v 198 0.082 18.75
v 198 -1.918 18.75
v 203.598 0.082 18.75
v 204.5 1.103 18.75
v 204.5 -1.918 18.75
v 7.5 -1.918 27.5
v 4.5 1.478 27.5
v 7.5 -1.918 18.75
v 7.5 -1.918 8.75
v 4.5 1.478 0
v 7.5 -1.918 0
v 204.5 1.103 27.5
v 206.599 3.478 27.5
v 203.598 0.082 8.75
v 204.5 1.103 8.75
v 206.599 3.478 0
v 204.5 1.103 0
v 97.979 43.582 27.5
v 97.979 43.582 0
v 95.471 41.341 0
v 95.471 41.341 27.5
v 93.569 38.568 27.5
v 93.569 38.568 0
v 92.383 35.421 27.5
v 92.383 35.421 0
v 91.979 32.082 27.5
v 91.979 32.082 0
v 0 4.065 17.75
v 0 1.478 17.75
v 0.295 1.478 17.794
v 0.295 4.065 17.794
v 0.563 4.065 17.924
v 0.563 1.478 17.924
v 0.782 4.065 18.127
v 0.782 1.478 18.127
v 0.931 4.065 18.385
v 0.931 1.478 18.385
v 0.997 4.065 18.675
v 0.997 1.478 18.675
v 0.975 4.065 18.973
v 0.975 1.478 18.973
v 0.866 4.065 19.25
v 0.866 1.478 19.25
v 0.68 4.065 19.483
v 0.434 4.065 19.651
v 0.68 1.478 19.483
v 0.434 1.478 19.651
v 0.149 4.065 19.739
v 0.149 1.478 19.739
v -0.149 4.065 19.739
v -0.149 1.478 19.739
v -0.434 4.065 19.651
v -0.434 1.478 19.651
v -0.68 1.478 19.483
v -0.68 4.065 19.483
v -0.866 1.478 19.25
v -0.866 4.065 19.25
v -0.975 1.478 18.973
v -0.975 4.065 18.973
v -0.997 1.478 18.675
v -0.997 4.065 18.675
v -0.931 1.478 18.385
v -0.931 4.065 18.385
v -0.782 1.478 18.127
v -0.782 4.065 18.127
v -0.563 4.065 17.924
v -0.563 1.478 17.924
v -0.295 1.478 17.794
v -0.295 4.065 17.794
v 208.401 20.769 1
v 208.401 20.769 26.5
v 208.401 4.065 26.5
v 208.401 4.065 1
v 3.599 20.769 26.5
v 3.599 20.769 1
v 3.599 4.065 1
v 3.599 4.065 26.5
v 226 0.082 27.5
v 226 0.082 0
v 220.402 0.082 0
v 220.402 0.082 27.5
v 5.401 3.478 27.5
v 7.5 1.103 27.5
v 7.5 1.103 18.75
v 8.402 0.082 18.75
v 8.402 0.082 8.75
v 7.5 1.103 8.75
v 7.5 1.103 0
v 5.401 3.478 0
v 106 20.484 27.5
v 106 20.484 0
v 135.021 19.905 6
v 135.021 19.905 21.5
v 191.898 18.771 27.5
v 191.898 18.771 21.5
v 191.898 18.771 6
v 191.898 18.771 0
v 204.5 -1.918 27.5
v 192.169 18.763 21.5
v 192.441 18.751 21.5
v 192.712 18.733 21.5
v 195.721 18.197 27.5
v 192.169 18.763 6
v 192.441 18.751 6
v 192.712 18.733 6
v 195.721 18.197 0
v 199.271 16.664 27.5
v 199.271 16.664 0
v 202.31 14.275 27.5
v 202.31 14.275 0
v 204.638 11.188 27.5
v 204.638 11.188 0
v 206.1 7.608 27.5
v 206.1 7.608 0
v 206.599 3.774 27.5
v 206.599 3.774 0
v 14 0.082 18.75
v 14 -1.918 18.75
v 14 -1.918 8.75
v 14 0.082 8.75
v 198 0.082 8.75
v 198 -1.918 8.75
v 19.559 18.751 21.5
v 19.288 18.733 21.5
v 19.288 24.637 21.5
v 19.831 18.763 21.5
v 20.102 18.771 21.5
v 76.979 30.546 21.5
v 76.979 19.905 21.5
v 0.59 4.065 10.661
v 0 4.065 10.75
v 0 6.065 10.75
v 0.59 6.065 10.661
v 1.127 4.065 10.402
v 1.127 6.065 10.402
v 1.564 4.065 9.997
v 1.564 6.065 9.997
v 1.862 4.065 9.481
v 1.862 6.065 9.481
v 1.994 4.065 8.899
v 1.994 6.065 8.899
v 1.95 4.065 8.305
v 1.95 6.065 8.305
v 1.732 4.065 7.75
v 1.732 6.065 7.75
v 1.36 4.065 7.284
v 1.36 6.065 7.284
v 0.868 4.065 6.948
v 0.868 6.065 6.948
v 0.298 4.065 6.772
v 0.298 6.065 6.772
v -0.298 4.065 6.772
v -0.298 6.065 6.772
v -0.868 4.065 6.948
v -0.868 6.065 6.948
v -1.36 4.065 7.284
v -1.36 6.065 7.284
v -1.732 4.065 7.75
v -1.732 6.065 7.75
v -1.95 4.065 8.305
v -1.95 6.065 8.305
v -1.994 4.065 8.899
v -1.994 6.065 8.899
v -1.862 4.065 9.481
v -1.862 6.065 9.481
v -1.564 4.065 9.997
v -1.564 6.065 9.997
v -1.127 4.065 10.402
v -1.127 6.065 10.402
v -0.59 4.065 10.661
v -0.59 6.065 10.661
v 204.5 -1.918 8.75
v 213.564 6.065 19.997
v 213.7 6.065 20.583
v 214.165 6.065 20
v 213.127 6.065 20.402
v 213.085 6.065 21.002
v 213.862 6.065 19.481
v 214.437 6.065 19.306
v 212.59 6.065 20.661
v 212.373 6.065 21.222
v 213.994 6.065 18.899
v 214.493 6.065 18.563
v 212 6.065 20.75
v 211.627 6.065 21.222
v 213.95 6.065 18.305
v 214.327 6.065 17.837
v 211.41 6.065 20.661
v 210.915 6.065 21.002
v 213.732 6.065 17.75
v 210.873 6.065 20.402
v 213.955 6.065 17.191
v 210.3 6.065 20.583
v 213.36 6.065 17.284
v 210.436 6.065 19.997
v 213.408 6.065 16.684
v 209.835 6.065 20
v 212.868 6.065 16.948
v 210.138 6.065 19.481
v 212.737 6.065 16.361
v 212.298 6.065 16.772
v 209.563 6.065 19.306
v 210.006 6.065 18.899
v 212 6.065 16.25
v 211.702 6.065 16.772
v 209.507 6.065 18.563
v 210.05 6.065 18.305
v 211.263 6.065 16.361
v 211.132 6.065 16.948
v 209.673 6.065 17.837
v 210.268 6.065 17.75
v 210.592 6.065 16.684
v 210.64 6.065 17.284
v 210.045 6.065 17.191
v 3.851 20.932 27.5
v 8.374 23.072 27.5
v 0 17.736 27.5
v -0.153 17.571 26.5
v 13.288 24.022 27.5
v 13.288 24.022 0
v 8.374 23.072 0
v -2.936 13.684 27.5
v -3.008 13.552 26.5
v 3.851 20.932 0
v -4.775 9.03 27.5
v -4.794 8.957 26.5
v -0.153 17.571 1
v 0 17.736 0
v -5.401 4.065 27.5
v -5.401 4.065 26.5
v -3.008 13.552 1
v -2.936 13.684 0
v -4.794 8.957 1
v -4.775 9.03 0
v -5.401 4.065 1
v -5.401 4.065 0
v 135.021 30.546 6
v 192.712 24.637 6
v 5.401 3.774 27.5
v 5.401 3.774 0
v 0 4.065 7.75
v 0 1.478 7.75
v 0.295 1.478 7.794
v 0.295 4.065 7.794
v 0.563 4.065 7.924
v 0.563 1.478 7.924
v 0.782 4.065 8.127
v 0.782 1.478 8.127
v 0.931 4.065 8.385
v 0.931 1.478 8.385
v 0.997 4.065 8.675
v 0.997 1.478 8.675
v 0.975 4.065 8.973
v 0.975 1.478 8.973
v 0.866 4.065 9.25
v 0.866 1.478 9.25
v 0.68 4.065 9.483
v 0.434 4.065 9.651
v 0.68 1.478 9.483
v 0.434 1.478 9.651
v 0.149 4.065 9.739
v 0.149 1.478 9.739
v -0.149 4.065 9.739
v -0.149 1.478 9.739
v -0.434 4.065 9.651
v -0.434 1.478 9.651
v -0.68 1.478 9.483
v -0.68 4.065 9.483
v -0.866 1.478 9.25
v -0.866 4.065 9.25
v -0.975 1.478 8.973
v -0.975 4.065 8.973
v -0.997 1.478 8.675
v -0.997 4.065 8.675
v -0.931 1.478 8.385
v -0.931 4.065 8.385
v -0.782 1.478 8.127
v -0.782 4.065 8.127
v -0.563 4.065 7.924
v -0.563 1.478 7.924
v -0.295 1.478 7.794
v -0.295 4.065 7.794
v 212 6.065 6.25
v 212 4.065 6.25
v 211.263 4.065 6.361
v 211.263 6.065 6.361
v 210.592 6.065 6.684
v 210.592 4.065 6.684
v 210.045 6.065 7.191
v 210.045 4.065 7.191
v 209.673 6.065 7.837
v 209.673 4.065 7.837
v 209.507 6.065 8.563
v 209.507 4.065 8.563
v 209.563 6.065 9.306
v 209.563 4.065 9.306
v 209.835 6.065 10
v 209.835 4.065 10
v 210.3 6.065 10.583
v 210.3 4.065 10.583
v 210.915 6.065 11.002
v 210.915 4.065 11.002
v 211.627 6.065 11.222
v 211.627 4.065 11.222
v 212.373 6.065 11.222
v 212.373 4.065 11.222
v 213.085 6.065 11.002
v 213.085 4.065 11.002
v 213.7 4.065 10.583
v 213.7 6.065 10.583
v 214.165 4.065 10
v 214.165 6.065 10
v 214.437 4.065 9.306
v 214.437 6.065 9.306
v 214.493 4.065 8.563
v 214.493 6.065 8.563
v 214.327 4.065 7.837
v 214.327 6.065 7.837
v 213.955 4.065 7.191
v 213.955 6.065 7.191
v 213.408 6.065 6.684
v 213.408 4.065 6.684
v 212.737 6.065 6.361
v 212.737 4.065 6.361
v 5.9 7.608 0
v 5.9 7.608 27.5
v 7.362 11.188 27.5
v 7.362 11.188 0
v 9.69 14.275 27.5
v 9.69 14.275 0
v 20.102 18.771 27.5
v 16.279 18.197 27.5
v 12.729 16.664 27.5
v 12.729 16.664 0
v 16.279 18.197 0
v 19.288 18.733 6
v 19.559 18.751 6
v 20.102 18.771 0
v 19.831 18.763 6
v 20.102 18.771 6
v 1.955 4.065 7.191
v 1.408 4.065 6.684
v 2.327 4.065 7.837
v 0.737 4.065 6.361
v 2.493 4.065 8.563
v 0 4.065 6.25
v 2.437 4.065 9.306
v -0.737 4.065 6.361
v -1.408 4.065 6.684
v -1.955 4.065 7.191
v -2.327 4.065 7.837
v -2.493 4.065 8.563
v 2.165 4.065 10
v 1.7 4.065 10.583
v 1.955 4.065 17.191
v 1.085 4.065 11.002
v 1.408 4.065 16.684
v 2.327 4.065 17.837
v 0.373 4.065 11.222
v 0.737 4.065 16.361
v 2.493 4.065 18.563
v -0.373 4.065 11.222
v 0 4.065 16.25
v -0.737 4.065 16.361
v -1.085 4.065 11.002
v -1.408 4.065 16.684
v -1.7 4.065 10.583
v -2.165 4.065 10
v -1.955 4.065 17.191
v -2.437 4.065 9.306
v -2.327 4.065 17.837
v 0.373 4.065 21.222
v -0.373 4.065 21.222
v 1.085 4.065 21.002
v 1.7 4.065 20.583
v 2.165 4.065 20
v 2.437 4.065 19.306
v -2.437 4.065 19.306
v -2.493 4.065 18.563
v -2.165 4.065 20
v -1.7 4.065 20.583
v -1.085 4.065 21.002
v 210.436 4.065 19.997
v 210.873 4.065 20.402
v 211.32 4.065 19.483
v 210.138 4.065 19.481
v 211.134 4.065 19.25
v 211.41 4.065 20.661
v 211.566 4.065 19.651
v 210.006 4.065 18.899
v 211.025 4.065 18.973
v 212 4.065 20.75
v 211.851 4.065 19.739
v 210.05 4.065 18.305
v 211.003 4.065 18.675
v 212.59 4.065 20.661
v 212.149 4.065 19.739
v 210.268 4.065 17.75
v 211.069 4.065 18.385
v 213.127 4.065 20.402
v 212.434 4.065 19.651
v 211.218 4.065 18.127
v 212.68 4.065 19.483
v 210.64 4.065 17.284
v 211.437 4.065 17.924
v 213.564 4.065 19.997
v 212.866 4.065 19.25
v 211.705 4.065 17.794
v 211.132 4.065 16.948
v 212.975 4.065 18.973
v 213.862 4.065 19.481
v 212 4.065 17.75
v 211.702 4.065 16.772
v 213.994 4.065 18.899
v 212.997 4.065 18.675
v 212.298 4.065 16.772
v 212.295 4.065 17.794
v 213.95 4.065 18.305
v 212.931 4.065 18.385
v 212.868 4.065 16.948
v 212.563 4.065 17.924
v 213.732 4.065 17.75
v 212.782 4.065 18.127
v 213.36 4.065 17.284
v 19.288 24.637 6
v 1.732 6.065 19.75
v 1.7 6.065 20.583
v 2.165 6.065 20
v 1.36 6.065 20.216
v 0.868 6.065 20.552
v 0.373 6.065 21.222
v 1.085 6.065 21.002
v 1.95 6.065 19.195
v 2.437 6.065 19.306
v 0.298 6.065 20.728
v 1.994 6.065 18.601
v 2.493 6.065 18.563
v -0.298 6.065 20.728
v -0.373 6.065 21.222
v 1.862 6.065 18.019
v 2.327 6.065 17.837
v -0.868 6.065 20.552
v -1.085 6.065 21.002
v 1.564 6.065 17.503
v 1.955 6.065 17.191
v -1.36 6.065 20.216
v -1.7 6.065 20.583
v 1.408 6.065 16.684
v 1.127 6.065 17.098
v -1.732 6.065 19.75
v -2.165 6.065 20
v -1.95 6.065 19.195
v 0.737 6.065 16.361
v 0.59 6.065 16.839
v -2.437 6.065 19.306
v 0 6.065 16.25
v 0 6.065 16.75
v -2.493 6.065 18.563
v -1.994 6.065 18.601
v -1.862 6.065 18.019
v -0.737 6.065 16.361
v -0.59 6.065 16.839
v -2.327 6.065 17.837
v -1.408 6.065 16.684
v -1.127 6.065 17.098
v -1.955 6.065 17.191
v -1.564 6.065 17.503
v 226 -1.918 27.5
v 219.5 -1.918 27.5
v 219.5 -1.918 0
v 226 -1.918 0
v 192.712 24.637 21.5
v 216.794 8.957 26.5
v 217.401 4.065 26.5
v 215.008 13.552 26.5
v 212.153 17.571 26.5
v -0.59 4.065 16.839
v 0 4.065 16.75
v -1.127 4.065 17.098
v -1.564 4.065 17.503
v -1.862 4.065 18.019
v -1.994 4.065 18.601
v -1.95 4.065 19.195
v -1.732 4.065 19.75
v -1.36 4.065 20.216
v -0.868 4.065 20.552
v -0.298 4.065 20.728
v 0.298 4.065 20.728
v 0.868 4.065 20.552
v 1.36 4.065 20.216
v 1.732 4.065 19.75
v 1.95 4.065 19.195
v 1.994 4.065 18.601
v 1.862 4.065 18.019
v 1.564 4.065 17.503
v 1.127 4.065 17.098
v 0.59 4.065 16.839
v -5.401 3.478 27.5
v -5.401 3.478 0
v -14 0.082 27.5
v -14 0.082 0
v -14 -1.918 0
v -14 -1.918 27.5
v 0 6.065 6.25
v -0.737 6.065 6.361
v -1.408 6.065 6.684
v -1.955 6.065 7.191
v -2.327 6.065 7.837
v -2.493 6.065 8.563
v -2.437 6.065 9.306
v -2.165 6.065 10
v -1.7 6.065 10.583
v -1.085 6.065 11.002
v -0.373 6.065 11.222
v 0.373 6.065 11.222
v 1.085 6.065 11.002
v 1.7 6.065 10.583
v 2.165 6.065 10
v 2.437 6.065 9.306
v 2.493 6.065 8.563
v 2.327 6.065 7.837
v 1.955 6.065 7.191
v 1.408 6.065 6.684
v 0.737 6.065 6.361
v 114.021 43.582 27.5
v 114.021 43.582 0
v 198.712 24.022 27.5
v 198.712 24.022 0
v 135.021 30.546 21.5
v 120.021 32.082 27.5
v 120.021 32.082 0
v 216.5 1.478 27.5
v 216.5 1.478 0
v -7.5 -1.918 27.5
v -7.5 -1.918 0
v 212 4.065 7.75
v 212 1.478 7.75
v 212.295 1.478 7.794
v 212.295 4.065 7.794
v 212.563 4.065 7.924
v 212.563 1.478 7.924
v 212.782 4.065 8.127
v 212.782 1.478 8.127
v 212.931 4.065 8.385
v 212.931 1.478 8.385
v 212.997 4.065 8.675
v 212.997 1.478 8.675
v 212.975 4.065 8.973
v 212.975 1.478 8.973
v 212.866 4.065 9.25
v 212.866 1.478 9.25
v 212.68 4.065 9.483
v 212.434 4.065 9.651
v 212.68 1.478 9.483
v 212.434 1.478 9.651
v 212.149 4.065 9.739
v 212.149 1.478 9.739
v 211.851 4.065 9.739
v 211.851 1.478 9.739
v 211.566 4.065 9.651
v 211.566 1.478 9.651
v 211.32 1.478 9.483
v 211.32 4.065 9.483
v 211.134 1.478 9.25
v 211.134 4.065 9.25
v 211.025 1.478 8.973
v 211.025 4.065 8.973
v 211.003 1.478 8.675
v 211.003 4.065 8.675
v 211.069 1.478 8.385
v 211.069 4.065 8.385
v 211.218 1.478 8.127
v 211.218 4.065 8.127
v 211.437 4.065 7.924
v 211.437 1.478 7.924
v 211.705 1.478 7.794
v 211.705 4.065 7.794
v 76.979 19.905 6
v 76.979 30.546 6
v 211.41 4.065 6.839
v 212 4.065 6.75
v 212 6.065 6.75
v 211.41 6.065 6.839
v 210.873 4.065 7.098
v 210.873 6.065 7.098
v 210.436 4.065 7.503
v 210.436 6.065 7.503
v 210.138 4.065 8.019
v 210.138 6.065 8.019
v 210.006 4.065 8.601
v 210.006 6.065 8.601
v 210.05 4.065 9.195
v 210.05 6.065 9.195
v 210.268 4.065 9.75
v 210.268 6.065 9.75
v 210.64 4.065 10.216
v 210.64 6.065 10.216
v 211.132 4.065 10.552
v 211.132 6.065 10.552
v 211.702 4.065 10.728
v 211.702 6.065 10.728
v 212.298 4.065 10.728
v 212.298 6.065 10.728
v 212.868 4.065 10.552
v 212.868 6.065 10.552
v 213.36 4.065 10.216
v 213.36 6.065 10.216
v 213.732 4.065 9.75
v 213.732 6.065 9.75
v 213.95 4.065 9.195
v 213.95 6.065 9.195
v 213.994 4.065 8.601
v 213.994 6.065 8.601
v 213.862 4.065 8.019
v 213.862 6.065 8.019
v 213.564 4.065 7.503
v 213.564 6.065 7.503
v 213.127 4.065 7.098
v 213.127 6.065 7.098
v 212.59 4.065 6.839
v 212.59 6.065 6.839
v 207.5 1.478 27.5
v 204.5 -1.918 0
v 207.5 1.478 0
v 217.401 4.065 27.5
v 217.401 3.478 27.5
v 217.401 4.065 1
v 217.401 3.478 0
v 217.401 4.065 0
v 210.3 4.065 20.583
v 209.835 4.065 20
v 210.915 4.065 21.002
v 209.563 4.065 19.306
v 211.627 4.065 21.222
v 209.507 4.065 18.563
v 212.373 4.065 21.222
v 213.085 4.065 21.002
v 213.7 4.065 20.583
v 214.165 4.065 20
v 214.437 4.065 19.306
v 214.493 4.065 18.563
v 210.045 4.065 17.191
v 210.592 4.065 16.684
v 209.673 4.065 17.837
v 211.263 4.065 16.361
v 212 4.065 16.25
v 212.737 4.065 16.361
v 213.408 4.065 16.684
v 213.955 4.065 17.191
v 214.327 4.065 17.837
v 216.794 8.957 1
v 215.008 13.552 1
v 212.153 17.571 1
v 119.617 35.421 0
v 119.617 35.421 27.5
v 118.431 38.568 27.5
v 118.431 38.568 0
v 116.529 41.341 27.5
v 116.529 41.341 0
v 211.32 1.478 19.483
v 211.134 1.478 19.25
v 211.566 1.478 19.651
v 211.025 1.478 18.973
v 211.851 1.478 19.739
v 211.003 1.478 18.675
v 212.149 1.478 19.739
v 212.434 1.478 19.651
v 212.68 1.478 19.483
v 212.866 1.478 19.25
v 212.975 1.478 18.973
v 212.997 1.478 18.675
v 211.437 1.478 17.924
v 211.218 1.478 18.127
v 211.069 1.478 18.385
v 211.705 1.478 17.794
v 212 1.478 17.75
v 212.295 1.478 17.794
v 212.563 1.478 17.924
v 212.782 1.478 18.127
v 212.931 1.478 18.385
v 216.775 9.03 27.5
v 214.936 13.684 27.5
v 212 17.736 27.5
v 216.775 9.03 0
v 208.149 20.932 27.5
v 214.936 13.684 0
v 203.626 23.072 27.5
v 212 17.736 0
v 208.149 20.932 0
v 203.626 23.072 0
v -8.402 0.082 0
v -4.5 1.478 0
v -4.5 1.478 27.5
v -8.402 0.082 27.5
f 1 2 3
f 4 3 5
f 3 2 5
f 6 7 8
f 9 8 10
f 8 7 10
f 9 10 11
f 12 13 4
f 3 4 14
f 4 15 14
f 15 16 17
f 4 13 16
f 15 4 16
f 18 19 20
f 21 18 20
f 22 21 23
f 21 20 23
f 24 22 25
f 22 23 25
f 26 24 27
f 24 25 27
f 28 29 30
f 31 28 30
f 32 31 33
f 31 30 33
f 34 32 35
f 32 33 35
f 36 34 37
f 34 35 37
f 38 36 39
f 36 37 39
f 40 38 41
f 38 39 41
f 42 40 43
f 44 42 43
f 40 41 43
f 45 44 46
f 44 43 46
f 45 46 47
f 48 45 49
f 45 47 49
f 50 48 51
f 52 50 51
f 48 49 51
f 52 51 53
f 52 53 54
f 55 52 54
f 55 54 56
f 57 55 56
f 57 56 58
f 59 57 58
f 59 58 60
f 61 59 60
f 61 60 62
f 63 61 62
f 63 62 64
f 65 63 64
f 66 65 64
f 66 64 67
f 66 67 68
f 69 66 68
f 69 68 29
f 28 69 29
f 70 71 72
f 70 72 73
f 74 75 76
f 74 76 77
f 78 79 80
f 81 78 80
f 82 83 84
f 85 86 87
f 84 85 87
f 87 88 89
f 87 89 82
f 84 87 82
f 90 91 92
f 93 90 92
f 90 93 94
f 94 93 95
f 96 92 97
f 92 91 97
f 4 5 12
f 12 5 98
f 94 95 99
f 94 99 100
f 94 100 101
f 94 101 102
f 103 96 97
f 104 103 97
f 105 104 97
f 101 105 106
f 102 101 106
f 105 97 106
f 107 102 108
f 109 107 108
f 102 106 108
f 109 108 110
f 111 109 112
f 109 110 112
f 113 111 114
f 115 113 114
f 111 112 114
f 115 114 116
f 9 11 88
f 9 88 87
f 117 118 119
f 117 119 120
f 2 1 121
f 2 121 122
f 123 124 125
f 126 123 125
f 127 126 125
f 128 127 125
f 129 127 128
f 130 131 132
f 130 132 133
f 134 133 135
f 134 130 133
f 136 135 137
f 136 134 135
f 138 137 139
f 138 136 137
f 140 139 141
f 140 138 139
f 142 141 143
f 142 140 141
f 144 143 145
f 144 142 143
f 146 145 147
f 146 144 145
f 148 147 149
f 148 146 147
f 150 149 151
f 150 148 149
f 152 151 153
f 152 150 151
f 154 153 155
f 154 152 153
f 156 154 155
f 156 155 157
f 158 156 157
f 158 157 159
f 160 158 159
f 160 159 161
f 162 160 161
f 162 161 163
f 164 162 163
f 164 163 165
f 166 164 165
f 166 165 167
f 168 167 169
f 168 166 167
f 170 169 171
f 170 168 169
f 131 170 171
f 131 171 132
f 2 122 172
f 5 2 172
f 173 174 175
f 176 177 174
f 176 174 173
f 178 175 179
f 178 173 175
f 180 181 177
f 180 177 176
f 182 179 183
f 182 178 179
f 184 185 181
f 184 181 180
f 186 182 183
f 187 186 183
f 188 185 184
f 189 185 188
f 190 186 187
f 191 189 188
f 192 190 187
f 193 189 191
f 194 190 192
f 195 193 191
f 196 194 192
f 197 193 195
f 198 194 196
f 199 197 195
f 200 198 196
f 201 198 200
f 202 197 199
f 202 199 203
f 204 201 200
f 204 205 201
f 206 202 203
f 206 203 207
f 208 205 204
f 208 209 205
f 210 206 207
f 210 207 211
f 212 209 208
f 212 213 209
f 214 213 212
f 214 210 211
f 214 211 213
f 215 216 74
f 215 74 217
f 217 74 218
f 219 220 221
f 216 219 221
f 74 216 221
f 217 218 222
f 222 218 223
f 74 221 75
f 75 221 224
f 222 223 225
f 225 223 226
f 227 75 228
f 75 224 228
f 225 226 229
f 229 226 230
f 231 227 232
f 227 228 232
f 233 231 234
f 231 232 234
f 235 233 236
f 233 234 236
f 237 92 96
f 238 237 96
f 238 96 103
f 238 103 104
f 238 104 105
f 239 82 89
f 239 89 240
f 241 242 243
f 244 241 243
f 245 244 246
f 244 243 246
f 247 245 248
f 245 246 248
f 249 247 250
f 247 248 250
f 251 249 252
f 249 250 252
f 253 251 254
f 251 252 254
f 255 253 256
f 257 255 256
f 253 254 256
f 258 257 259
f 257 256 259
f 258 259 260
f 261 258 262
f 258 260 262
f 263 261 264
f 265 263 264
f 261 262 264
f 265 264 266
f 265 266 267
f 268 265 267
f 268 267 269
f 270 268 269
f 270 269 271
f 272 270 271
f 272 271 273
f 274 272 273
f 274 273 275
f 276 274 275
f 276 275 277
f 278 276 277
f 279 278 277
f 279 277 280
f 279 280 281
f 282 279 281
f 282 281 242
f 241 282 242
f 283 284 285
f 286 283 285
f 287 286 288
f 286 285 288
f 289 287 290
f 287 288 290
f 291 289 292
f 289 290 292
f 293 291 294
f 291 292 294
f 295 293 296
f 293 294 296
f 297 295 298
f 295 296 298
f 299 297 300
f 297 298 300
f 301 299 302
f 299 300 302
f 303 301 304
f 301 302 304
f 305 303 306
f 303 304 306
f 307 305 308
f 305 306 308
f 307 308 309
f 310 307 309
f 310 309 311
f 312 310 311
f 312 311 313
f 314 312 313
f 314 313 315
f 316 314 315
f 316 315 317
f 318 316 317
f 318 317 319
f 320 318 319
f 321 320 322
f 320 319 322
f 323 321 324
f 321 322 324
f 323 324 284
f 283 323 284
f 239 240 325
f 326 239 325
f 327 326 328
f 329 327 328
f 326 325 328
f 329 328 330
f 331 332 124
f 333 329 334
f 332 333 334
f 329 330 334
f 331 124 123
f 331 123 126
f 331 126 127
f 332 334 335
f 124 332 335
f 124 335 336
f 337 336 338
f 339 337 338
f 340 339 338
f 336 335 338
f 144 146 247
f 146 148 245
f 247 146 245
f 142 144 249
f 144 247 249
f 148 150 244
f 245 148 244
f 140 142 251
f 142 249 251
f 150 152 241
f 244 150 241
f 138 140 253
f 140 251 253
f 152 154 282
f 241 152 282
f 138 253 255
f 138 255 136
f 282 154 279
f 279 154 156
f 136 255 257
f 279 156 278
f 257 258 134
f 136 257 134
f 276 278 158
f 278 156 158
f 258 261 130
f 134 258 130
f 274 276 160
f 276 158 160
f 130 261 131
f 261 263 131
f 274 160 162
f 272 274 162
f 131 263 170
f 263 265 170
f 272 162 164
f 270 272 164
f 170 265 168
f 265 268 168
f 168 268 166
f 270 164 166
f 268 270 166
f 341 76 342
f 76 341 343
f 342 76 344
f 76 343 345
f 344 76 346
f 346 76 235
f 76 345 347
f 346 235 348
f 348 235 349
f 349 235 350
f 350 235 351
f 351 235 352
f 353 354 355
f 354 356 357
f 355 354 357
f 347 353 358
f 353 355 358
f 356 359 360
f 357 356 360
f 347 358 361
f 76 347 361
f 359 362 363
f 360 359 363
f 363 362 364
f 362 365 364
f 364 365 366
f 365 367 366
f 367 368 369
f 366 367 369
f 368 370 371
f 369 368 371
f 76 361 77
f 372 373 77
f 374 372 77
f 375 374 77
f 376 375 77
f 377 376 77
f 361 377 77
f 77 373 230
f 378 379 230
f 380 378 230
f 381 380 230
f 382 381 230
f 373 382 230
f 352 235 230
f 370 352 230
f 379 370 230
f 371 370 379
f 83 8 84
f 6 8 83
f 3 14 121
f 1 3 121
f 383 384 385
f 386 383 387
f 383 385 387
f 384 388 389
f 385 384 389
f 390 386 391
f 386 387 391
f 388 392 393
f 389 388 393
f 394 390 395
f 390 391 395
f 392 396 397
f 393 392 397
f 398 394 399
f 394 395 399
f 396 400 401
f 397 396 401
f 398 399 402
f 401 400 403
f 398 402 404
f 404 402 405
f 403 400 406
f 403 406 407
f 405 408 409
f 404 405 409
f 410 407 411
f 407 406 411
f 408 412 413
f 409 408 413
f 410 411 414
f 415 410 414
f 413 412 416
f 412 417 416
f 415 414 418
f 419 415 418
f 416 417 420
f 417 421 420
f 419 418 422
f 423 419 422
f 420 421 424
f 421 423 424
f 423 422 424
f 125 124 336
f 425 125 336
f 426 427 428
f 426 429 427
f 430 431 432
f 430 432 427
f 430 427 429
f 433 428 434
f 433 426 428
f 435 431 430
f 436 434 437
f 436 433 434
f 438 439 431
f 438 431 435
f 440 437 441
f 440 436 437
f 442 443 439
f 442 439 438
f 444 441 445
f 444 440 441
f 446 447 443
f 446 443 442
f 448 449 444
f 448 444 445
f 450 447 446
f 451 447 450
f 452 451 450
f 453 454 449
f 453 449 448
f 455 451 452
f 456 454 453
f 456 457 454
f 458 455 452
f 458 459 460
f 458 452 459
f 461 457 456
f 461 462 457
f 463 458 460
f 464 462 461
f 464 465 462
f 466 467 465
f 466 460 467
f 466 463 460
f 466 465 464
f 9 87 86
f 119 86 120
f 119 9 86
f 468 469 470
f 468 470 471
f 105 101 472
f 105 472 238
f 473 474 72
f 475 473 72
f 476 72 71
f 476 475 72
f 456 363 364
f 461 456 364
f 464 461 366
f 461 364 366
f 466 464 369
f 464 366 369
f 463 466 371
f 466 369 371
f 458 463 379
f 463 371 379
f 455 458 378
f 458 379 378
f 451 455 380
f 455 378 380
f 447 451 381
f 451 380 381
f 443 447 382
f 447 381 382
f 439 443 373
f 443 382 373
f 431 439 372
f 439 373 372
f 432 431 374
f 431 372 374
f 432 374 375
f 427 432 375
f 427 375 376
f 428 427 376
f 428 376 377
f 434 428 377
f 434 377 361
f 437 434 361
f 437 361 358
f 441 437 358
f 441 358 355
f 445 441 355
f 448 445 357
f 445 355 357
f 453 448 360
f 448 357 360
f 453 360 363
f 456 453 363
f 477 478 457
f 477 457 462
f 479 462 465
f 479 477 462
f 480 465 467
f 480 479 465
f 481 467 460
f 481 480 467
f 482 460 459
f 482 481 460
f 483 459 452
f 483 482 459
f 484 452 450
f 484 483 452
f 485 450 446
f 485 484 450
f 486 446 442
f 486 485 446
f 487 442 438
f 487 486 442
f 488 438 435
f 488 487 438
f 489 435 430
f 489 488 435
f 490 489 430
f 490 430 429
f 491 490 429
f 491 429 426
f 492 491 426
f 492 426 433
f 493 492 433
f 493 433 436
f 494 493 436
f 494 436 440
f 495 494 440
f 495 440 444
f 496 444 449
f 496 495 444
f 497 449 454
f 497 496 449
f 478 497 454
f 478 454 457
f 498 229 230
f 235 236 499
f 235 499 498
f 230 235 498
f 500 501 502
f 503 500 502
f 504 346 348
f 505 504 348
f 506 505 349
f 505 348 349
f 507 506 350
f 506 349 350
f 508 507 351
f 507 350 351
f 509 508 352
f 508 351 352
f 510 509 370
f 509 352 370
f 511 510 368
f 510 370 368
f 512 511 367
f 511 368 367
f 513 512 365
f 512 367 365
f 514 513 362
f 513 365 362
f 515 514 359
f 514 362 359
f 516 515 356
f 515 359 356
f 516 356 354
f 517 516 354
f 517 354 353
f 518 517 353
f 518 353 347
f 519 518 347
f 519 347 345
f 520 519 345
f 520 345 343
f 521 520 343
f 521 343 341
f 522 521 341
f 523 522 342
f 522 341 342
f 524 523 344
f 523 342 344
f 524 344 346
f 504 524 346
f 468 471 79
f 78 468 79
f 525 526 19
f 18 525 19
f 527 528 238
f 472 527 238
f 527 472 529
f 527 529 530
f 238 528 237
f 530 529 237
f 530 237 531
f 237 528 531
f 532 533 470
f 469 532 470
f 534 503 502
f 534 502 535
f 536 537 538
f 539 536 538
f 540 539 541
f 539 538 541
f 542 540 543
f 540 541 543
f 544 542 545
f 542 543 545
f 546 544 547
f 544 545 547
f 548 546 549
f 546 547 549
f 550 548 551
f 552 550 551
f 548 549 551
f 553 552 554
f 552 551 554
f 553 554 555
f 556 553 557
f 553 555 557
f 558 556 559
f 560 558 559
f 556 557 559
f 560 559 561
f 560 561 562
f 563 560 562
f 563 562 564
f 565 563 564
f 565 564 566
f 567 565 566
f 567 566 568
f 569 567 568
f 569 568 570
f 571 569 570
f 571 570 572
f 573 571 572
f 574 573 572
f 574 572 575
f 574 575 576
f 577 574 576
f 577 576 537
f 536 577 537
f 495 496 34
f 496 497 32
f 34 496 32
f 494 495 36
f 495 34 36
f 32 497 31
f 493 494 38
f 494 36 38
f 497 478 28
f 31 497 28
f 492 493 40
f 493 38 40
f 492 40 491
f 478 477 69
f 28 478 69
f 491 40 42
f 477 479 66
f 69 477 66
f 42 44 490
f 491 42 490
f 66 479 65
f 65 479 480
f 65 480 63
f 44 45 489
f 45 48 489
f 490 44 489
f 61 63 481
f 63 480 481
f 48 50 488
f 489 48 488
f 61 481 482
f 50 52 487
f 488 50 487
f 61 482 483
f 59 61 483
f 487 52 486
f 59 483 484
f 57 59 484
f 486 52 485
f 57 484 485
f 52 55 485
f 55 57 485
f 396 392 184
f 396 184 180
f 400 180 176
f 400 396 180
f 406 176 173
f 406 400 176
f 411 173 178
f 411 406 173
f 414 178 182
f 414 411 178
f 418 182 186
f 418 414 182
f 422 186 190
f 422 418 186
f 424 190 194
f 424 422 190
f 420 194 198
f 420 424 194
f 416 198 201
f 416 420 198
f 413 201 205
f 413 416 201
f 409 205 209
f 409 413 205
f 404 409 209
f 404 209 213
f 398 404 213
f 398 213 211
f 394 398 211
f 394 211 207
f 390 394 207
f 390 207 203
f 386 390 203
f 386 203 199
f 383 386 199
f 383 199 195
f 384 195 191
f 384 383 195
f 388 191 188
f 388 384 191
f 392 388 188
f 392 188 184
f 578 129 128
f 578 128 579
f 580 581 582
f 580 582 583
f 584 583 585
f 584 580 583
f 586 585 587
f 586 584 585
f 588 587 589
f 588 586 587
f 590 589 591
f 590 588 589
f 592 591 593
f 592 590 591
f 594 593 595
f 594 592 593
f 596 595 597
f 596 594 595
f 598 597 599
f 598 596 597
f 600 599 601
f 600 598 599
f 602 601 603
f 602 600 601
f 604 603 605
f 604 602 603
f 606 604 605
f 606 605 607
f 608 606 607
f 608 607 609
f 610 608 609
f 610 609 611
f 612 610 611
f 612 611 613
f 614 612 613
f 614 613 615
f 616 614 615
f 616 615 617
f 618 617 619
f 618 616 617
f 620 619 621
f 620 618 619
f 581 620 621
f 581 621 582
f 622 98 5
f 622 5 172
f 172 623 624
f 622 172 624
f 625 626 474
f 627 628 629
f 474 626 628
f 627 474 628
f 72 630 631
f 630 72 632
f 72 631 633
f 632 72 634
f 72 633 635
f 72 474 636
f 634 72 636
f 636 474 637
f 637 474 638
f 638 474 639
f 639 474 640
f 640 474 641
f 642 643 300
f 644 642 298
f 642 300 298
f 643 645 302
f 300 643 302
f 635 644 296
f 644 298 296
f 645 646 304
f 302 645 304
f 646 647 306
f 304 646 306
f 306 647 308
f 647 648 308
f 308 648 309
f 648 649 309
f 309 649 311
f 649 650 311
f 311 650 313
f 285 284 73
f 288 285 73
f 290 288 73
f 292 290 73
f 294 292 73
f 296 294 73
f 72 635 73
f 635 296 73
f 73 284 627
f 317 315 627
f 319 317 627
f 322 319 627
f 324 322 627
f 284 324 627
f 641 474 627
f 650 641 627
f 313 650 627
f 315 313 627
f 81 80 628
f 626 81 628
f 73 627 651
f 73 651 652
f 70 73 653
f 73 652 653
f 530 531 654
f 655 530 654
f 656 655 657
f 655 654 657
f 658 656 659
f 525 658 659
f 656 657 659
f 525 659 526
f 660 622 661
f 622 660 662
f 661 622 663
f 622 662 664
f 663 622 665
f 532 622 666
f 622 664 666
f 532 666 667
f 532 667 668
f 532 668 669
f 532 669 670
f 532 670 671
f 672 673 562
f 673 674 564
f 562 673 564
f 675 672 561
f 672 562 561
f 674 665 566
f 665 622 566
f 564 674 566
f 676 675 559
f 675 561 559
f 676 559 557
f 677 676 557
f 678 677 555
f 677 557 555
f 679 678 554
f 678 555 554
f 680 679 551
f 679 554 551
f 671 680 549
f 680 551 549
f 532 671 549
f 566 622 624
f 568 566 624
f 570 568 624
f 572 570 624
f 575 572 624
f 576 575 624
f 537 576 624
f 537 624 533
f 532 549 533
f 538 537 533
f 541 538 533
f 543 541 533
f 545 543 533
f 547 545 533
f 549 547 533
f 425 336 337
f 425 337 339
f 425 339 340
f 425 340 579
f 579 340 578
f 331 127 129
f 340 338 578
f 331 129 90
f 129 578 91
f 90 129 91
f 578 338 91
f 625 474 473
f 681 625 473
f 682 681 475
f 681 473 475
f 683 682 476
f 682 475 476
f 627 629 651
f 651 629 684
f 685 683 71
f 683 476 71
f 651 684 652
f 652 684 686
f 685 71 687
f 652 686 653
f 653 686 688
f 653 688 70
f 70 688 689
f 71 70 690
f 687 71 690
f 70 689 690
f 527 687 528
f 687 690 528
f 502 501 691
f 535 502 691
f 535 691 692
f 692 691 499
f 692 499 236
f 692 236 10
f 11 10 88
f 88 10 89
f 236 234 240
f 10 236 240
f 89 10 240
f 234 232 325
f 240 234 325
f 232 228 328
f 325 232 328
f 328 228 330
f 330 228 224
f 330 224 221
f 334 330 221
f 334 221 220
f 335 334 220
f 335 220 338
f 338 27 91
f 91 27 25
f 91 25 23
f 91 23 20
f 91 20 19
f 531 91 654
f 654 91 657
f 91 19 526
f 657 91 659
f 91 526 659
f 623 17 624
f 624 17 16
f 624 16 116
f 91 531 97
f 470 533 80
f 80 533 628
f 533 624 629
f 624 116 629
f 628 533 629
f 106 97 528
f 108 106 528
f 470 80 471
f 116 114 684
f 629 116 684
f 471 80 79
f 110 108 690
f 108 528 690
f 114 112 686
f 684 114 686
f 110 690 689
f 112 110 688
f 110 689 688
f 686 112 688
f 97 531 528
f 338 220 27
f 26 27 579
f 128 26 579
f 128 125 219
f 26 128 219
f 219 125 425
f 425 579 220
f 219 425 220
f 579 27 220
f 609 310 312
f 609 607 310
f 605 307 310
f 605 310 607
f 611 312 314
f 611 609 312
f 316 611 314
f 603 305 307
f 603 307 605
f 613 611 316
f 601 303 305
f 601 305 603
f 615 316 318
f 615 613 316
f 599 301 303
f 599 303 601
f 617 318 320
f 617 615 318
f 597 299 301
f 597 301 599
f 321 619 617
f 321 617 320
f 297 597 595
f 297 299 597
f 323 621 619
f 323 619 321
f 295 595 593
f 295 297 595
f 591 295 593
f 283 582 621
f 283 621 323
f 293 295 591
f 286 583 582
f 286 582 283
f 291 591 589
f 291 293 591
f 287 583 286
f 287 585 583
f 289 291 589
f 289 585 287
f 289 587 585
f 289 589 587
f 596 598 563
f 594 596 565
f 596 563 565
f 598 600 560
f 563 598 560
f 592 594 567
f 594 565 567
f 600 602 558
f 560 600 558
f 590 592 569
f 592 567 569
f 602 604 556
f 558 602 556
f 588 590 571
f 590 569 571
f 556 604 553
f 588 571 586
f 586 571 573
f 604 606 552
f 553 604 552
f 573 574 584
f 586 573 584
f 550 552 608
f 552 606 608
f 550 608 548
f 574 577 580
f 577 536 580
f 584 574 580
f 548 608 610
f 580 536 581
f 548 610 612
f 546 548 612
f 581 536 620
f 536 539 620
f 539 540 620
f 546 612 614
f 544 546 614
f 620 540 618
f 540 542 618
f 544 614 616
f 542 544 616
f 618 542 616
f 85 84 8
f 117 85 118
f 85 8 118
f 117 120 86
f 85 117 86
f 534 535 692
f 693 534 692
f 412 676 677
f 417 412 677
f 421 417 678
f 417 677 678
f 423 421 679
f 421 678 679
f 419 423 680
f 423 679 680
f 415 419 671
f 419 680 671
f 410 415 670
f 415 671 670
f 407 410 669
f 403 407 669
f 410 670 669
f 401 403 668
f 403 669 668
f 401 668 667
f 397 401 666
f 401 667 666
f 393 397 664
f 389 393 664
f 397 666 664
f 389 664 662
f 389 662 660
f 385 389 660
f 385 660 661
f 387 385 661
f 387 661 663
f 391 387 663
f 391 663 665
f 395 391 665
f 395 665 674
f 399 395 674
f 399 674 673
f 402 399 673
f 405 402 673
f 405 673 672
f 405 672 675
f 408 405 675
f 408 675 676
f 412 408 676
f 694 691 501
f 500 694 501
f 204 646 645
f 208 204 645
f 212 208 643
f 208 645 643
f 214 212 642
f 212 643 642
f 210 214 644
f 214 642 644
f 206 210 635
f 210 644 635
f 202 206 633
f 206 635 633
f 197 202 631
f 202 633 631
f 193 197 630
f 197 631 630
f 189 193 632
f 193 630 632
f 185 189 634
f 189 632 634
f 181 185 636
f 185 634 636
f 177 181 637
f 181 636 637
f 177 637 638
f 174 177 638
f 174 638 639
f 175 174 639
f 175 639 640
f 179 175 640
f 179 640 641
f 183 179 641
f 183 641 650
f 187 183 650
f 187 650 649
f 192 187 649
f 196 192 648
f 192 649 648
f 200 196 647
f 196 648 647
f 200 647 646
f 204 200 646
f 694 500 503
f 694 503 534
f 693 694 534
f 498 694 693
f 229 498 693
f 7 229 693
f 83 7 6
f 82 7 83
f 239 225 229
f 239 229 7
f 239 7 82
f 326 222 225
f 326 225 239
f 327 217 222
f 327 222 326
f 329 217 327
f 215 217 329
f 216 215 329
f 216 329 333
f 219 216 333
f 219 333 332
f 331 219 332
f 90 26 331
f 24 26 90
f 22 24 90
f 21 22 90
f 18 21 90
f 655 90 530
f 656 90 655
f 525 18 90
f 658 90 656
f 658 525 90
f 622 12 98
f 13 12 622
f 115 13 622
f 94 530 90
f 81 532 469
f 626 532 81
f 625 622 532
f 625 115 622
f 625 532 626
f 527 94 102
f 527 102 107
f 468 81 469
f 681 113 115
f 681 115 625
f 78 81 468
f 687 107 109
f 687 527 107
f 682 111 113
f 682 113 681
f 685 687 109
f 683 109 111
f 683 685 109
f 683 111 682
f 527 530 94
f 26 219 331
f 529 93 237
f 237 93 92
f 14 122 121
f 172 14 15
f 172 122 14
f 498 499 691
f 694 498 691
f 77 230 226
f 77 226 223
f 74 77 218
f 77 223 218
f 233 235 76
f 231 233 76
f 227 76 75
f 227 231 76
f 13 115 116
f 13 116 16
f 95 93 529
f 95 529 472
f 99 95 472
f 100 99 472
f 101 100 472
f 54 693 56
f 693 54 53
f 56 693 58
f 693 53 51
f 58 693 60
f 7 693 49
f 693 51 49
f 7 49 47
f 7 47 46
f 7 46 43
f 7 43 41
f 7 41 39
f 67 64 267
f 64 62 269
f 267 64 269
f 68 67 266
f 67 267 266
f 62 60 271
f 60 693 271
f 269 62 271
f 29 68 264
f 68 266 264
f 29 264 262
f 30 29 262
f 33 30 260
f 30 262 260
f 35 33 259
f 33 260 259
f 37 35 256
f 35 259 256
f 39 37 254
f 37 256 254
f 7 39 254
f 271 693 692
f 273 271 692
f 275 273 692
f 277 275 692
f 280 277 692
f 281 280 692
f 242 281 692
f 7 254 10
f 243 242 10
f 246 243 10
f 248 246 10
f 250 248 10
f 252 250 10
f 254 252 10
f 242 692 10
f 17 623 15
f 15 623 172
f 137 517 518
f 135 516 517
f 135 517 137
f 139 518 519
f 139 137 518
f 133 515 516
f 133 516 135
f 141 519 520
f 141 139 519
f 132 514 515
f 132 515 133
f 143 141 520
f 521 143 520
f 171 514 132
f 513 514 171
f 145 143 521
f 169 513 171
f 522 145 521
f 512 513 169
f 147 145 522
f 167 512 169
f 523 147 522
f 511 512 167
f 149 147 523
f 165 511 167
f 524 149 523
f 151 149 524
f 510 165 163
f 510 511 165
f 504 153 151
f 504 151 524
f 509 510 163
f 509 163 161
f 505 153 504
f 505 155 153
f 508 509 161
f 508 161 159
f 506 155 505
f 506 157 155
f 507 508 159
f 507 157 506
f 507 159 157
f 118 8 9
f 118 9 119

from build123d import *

# Parameters (mm, degrees)
BOSS_EXTRUDE1_DEPTH = 27.5
SKETCH3_W           = 6.5
SKETCH3_H           = 8.75
CUT_EXTRUDE1_DEPTH  = 5
SKETCH5_R           = 1
CUT_EXTRUDE2_DEPTH  = 232.527578609
SKETCH6_W           = 25.5
SKETCH6_H           = 20
CUT_EXTRUDE3_DEPTH  = 9
SKETCH7_W           = 25.5
SKETCH7_H           = 20
CUT_EXTRUDE4_DEPTH  = 9
SKETCH8_R           = 2.5
SKETCH8_R_2         = 2
BOSS_EXTRUDE2_DEPTH = 2
SKETCH10_W          = 57.691481813
SKETCH10_H          = 15.5
CUT_EXTRUDE5_DEPTH  = 232.800925283


with BuildPart() as part:
    # Sketch1 → Boss-Extrude1 (new body)
    with BuildSketch(Plane.XY):
        with BuildLine():
            Line((-4.499758881, 1.478052726), (0, 1.478052726))
            Line((0, 1.478052726), (4.499758881, 1.478052726))
            Line((4.499758881, 1.478052726), (7.5, -1.917676035))
            Line((7.5, -1.917676035), (14, -1.917676035))
            Line((14, -1.917676035), (14, 0.082323965))
            Line((14, 0.082323965), (8.40173886, 0.082323965))
            Line((8.40173886, 0.082323965), (5.401497741, 3.478052726))
            Line((5.401497741, 3.478052726), (5.401497741, 3.774186429))
            ThreePointArc((5.401497741, 3.774186429), (9.689685466, 14.274523461), (20.102441447, 18.771204977))
            Line((20.102441447, 18.771204977), (106, 20.484092471))
            Line((106, 20.484092471), (191.897558553, 18.771204977))
            ThreePointArc((191.897558553, 18.771204977), (202.310314534, 14.274523461), (206.598502259, 3.774186429))
            Line((206.598502259, 3.774186429), (206.598502259, 3.478052726))
            Line((206.598502259, 3.478052726), (203.59826114, 0.082323965))
            Line((203.59826114, 0.082323965), (198, 0.082323965))
            Line((198, 0.082323965), (198, -1.917676035))
            Line((198, -1.917676035), (204.5, -1.917676035))
            Line((204.5, -1.917676035), (207.500241119, 1.478052726))
            Line((207.500241119, 1.478052726), (212, 1.478052726))
            Line((212, 1.478052726), (216.499758881, 1.478052726))
            Line((216.499758881, 1.478052726), (219.5, -1.917676035))
            Line((219.5, -1.917676035), (226, -1.917676035))
            Line((226, -1.917676035), (226, 0.082323965))
            Line((226, 0.082323965), (220.40173886, 0.082323965))
            Line((220.40173886, 0.082323965), (217.401497741, 3.478052726))
            Line((217.401497741, 3.478052726), (217.401497741, 4.065324402))
            ThreePointArc((217.401497741, 4.065324402), (211.999722772, 17.736162927), (198.712315146, 24.022322116))
            Line((198.712315146, 24.022322116), (120.020833333, 32.082323965))
            ThreePointArc((120.020833333, 32.082323965), (118.430658364, 38.567884851), (114.020833333, 43.582323965))
            Line((114.020833333, 43.582323965), (97.979166667, 43.582323965))
            ThreePointArc((97.979166667, 43.582323965), (93.569341636, 38.567884851), (91.979166667, 32.082323965))
            Line((91.979166667, 32.082323965), (13.287684854, 24.022322116))
            ThreePointArc((13.287684854, 24.022322116), (0.000277228, 17.736162927), (-5.401497741, 4.065324402))
            Line((-5.401497741, 4.065324402), (-5.401497741, 3.478052726))
            Line((-5.401497741, 3.478052726), (-8.40173886, 0.082323965))
            Line((-8.40173886, 0.082323965), (-14, 0.082323965))
            Line((-14, 0.082323965), (-14, -1.917676035))
            Line((-14, -1.917676035), (-7.5, -1.917676035))
            Line((-7.5, -1.917676035), (-4.499758881, 1.478052726))
        make_face()
    extrude(amount=BOSS_EXTRUDE1_DEPTH)

    # Sketch3 → Cut-Extrude1 (cut)
    with BuildSketch(Plane.XZ.offset(1.917676035)):
        with Locations((10.75, 23.125)):
            Rectangle(SKETCH3_W, SKETCH3_H)
        with Locations((10.75, 4.375)):
            Rectangle(SKETCH3_W, SKETCH3_H)
        with Locations((201.25, 4.375)):
            Rectangle(SKETCH3_W, SKETCH3_H)
        with Locations((201.25, 23.125)):
            Rectangle(SKETCH3_W, SKETCH3_H)
    extrude(amount=-CUT_EXTRUDE1_DEPTH, mode=Mode.SUBTRACT)

    # Sketch5 → Cut-Extrude2 (cut, through all)
    with BuildSketch(Plane.XZ.offset(-1.478052726)):
        with Locations(Location((0, 18.75, 0), (0, 0, 270))):
            Circle(SKETCH5_R)
        with Locations(Location((0, 8.75, 0), (0, 0, 270))):
            Circle(SKETCH5_R)
        with Locations(Location((212, 8.75, 0), (0, 0, 270))):
            Circle(SKETCH5_R)
        with Locations(Location((212, 18.75, 0), (0, 0, 270))):
            Circle(SKETCH5_R)
    extrude(amount=-CUT_EXTRUDE2_DEPTH, mode=Mode.SUBTRACT)

    # Sketch6 → Cut-Extrude3 (cut)
    with BuildSketch(Plane.ZY.offset(5.401497741)):
        with Locations((13.75, 14.065324402)):
            Rectangle(SKETCH6_W, SKETCH6_H)
    extrude(amount=-CUT_EXTRUDE3_DEPTH, mode=Mode.SUBTRACT)

    # Sketch7 → Cut-Extrude4 (cut)
    with BuildSketch(Plane(origin=(217.401497741, 0, 0), x_dir=(0, 0, -1), z_dir=(1, 0, 0))):
        with Locations((-13.75, 14.065324402)):
            Rectangle(SKETCH7_W, SKETCH7_H)
    extrude(amount=-CUT_EXTRUDE4_DEPTH, mode=Mode.SUBTRACT)

    # Sketch8 → Boss-Extrude2 (add)
    # profile 1 of 4: a face of its own
    with BuildSketch(Plane(origin=(0, 4.065324402, 0), x_dir=(1, 0, 0), z_dir=(0, 1, 0))):
        with Locations(Location((0, -8.75, 0), (0, 0, 90))):
            Circle(SKETCH8_R)
        with Locations(Location((0, -8.75, 0), (0, 0, 270))):
            Circle(SKETCH8_R_2, mode=Mode.SUBTRACT)
    # profile 2 of 4: a face of its own
    with BuildSketch(Plane(origin=(0, 4.065324402, 0), x_dir=(1, 0, 0), z_dir=(0, 1, 0))):
        with Locations(Location((0, -18.75, 0), (0, 0, 90))):
            Circle(SKETCH8_R)
        with Locations(Location((0, -18.75, 0), (0, 0, 90))):
            Circle(SKETCH8_R_2, mode=Mode.SUBTRACT)
    # profile 3 of 4: a face of its own
    with BuildSketch(Plane(origin=(0, 4.065324402, 0), x_dir=(1, 0, 0), z_dir=(0, 1, 0))):
        with Locations(Location((212, -18.75, 0), (0, 0, 90))):
            Circle(SKETCH8_R)
        with Locations(Location((212, -18.75, 0), (0, 0, 270))):
            Circle(SKETCH8_R_2, mode=Mode.SUBTRACT)
    # profile 4 of 4: a face of its own
    with BuildSketch(Plane(origin=(0, 4.065324402, 0), x_dir=(1, 0, 0), z_dir=(0, 1, 0))):
        with Locations(Location((212, -8.75, 0), (0, 0, 90))):
            Circle(SKETCH8_R)
        with Locations(Location((212, -8.75, 0), (0, 0, 90))):
            Circle(SKETCH8_R_2, mode=Mode.SUBTRACT)
    extrude(amount=BOSS_EXTRUDE2_DEPTH)

    # Sketch10 → Cut-Extrude5 (cut, through all)
    with BuildSketch(Plane(origin=(0, 0, 0), x_dir=(1, 0, 0), z_dir=(0, 1, 0))):
        with Locations((163.86657424, -13.75)):
            Rectangle(SKETCH10_W, SKETCH10_H)
        with Locations((48.133425761, -13.75)):
            Rectangle(SKETCH10_W, SKETCH10_H)
    extrude(amount=CUT_EXTRUDE5_DEPTH, mode=Mode.SUBTRACT)


solid = part.part
